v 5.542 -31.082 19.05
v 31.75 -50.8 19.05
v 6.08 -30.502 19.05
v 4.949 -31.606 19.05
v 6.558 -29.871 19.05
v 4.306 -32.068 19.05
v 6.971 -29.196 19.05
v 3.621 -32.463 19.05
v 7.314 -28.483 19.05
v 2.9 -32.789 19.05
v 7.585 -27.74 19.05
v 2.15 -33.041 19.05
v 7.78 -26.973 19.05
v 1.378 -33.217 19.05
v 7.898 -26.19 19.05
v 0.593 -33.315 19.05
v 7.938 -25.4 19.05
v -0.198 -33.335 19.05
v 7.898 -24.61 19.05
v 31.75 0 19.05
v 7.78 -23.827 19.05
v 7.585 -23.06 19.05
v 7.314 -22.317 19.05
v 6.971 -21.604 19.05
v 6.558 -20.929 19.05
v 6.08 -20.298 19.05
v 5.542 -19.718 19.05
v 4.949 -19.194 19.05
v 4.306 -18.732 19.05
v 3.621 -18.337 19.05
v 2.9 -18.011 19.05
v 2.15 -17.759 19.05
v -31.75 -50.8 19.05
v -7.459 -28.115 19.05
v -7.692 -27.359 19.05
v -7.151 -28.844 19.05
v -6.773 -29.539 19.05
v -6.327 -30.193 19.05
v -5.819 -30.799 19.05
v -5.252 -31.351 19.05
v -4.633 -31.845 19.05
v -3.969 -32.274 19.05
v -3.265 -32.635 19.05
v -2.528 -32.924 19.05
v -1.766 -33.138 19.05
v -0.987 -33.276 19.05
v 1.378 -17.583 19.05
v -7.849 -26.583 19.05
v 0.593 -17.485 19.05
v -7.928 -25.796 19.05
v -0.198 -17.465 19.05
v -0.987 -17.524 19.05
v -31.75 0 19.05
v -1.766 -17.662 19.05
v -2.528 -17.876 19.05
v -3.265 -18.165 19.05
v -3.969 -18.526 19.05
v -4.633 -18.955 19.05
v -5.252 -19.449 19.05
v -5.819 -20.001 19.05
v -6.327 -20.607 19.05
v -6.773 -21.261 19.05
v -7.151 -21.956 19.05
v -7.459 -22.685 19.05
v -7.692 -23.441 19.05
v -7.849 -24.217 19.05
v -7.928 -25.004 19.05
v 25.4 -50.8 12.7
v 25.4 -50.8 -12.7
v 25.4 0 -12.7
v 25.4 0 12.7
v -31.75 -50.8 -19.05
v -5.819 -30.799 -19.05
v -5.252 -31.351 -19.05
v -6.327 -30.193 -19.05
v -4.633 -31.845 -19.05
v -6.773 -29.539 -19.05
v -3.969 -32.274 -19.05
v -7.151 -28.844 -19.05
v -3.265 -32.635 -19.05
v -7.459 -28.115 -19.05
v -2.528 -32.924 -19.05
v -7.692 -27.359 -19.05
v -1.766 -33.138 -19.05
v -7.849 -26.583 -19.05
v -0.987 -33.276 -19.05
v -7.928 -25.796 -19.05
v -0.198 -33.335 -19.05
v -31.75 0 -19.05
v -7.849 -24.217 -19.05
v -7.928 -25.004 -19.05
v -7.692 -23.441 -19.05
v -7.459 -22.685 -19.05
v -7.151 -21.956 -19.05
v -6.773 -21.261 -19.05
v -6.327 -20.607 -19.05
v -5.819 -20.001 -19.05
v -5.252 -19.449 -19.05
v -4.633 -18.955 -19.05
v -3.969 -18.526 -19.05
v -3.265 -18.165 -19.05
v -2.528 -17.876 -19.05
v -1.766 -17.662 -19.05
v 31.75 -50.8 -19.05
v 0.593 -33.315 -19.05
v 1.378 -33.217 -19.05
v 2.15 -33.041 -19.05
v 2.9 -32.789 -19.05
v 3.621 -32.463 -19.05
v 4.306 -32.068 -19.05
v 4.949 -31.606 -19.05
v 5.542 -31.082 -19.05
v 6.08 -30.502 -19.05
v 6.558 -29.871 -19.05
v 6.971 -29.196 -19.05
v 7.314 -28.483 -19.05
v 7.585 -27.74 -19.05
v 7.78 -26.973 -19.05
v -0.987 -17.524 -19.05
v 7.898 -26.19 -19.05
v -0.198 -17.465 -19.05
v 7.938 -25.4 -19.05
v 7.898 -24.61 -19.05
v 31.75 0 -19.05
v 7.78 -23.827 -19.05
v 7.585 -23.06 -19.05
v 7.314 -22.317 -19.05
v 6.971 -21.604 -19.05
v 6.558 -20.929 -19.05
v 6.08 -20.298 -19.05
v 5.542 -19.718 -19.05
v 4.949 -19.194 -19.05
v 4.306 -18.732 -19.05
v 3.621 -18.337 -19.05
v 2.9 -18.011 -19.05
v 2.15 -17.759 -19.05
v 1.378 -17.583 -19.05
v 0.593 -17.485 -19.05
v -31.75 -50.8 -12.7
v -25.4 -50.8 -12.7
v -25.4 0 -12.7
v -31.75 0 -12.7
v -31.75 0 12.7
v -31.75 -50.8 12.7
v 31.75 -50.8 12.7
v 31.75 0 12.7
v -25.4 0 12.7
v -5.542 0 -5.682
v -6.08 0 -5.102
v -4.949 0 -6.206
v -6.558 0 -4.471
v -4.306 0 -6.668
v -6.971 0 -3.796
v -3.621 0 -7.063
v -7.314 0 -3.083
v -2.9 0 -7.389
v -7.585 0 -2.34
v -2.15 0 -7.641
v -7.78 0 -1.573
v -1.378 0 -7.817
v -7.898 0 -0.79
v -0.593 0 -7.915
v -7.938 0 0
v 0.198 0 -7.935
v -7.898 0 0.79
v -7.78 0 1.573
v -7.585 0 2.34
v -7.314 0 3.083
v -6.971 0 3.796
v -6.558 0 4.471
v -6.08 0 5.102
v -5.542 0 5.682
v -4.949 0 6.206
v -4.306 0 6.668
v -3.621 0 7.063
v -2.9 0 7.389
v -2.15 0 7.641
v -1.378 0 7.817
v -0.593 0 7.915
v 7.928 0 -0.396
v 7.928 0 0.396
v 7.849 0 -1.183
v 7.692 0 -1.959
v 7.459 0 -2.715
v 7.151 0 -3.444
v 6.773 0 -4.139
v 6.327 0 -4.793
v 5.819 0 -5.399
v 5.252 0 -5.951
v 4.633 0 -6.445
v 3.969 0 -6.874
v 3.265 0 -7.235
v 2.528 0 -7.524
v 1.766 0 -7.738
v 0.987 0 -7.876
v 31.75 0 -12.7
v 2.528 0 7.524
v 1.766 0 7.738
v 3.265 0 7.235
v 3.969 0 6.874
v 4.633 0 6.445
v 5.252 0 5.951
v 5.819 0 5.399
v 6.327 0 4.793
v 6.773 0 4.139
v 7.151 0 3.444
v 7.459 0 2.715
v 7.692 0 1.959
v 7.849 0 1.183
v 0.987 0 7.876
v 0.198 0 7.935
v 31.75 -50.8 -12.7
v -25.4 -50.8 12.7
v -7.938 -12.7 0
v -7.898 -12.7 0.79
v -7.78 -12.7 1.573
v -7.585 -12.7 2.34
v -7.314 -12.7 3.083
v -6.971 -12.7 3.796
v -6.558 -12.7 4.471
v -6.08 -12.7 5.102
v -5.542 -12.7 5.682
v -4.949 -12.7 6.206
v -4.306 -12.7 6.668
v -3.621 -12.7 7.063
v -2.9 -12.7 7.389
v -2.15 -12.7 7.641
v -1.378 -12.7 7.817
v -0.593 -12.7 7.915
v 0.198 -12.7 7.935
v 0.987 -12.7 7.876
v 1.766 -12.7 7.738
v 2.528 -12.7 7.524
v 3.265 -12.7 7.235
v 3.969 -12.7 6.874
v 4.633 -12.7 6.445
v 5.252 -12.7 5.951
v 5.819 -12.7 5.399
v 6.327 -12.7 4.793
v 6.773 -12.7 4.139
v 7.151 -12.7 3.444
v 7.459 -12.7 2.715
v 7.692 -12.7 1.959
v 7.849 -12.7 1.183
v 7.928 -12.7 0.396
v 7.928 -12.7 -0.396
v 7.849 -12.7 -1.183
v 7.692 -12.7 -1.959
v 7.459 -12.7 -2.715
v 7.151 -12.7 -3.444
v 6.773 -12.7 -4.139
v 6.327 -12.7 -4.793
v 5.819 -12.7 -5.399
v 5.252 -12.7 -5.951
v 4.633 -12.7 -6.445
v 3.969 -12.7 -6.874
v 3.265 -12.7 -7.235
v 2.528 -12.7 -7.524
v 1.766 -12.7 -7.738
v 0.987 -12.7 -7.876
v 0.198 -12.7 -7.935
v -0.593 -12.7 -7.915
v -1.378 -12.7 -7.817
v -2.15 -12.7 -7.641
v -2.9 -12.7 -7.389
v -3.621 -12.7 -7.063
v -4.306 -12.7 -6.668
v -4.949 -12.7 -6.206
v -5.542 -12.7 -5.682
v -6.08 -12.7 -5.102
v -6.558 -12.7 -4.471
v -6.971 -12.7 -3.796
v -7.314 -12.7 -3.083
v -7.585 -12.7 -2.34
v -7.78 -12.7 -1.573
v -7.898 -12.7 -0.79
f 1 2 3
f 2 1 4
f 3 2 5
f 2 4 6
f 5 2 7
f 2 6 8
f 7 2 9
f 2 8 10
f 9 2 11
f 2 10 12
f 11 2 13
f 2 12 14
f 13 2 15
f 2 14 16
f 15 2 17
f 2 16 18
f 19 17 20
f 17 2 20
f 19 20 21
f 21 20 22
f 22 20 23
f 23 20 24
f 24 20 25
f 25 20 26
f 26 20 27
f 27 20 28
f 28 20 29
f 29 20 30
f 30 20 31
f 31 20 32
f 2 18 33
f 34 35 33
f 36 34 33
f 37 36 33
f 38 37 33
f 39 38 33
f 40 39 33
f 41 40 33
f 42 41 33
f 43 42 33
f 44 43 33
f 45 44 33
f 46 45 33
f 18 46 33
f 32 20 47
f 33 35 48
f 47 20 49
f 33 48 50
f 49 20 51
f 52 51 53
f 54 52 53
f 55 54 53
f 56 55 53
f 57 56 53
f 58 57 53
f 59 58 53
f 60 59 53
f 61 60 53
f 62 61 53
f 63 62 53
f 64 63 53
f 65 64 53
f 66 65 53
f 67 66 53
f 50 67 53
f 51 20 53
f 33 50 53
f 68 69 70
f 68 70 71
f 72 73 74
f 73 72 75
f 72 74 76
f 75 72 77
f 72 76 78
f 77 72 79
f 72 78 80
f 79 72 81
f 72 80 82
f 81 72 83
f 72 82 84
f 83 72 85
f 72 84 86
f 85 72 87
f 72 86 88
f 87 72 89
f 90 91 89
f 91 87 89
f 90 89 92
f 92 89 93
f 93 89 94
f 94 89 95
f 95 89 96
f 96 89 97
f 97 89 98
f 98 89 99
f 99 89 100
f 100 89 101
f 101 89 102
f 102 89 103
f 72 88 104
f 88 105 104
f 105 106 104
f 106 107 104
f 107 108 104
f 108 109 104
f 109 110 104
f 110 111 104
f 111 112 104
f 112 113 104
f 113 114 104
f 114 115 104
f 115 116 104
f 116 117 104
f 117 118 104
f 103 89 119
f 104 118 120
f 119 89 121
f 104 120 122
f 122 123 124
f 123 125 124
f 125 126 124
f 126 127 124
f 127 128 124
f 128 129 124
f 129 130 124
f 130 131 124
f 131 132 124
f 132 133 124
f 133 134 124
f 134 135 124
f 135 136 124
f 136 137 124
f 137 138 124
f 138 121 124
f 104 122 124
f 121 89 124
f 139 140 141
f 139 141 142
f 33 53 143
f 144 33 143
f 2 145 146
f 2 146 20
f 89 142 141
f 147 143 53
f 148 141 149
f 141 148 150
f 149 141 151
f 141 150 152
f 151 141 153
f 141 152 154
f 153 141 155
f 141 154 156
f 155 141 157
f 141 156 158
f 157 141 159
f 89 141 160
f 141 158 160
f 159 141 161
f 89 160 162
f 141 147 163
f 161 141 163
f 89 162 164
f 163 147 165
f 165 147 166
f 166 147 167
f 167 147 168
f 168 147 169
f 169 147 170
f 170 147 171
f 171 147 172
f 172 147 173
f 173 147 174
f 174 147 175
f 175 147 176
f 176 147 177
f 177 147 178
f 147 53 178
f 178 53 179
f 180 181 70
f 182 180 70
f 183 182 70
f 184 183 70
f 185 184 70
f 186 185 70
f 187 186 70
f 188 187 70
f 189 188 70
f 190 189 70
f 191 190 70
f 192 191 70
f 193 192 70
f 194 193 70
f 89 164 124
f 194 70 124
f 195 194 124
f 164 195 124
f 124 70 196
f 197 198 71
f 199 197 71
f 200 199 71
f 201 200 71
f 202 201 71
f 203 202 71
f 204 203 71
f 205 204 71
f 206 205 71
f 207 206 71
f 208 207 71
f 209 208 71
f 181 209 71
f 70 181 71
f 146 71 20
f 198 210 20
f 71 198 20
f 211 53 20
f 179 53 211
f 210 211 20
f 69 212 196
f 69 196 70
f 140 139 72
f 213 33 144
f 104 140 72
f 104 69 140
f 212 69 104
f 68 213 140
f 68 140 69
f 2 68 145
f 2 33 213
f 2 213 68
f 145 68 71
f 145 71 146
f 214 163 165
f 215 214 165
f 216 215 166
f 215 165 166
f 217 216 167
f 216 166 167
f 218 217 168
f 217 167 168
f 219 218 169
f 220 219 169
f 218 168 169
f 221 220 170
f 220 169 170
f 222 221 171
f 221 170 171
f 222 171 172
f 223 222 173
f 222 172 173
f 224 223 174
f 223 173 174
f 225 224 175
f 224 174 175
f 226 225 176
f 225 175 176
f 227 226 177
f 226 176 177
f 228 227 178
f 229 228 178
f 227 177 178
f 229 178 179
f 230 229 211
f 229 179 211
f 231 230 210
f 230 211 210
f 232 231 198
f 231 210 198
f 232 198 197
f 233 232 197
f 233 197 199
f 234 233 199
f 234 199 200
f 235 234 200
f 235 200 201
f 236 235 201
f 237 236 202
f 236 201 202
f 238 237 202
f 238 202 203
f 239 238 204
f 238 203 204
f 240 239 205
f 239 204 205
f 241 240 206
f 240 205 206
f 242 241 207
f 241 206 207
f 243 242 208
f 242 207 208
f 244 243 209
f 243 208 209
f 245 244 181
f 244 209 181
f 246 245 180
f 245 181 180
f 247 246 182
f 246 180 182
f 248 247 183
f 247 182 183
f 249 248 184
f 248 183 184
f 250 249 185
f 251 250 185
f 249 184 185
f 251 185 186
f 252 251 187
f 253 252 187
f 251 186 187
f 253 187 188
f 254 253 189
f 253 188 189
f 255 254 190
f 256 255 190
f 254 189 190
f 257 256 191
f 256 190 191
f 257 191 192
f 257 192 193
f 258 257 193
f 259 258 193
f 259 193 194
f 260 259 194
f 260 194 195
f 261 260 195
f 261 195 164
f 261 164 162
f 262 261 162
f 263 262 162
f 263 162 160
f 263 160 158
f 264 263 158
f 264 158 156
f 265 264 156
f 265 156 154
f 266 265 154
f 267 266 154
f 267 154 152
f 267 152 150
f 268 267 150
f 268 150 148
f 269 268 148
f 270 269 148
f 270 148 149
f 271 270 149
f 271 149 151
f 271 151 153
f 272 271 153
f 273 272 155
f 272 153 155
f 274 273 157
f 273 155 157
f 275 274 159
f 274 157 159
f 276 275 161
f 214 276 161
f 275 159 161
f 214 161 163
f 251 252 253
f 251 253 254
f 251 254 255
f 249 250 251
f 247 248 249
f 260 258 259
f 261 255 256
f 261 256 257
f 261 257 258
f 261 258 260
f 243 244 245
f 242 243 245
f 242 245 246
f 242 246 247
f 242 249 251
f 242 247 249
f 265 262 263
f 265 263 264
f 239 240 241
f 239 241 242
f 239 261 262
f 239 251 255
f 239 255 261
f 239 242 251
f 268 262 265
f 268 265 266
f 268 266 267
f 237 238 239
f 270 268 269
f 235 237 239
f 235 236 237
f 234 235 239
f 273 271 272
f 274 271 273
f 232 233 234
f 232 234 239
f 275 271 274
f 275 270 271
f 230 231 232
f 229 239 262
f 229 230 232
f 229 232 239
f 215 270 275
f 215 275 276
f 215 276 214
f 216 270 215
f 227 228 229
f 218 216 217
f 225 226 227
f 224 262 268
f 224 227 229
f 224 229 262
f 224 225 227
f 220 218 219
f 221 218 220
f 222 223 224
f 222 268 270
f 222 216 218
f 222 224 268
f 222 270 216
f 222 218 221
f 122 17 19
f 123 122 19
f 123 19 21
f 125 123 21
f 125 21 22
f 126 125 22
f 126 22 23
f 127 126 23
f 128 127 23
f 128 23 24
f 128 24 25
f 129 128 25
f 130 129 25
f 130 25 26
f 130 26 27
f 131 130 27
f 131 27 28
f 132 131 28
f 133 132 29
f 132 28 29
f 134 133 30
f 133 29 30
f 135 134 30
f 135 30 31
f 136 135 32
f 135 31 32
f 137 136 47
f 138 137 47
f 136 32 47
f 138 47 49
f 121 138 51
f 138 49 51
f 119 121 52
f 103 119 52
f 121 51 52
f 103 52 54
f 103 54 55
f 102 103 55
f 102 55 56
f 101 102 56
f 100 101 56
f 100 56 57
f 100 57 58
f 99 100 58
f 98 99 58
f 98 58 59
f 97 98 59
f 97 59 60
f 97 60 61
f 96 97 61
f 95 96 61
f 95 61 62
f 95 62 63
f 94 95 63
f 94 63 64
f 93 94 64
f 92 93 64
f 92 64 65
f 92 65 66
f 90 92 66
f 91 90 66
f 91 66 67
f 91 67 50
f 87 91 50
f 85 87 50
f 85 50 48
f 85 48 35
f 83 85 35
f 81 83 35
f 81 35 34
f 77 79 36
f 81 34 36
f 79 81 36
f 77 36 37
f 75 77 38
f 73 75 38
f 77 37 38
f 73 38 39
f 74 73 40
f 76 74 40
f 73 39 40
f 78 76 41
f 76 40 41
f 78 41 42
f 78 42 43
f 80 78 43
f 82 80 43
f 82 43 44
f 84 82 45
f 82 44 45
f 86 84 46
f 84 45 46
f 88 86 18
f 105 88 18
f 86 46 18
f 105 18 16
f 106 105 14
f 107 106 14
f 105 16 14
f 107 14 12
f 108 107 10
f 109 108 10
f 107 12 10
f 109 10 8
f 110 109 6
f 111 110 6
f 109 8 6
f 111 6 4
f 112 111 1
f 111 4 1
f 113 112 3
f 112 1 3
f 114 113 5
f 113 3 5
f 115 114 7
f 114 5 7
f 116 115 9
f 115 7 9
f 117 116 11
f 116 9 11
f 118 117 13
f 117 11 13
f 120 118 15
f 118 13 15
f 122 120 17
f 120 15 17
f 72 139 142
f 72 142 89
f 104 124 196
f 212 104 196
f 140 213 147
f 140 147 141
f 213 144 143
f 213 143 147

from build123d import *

# Parameters (mm, degrees)
F1_DEPTH = 50.8
F2_R     = 7.9375
F3_DEPTH = 38.101
F4_R     = 7.9375
F5_DEPTH = 12.7


with BuildPart() as f1:
    # F0 (on Front) → F1 (new body)
    with BuildSketch(Plane.XZ):
        Polygon((-31.75, -19.05), (31.75, -19.05), (31.75, -12.7), (25.4, -12.7), (25.4, 12.7), (31.75, 12.7), (31.75, 19.05), (-31.75, 19.05), (-31.75, 12.7), (-25.4, 12.7), (-25.4, -12.7), (-31.75, -12.7), align=None)
    extrude(amount=F1_DEPTH)

    # F2 (on face) → F3 (cut, through all)
    with BuildSketch(Plane.XY.offset(19.05)):
        with Locations((0, -25.4)):
            Circle(F2_R)
    extrude(amount=-F3_DEPTH, mode=Mode.SUBTRACT)

    # F4 (on face) → F5 (cut)
    with BuildSketch(Plane(origin=(0, 0, 0), x_dir=(-1, 0, 0), z_dir=(0, 1, 0))):
        Circle(F4_R)
    extrude(amount=-F5_DEPTH, mode=Mode.SUBTRACT)


solid = f1.part
